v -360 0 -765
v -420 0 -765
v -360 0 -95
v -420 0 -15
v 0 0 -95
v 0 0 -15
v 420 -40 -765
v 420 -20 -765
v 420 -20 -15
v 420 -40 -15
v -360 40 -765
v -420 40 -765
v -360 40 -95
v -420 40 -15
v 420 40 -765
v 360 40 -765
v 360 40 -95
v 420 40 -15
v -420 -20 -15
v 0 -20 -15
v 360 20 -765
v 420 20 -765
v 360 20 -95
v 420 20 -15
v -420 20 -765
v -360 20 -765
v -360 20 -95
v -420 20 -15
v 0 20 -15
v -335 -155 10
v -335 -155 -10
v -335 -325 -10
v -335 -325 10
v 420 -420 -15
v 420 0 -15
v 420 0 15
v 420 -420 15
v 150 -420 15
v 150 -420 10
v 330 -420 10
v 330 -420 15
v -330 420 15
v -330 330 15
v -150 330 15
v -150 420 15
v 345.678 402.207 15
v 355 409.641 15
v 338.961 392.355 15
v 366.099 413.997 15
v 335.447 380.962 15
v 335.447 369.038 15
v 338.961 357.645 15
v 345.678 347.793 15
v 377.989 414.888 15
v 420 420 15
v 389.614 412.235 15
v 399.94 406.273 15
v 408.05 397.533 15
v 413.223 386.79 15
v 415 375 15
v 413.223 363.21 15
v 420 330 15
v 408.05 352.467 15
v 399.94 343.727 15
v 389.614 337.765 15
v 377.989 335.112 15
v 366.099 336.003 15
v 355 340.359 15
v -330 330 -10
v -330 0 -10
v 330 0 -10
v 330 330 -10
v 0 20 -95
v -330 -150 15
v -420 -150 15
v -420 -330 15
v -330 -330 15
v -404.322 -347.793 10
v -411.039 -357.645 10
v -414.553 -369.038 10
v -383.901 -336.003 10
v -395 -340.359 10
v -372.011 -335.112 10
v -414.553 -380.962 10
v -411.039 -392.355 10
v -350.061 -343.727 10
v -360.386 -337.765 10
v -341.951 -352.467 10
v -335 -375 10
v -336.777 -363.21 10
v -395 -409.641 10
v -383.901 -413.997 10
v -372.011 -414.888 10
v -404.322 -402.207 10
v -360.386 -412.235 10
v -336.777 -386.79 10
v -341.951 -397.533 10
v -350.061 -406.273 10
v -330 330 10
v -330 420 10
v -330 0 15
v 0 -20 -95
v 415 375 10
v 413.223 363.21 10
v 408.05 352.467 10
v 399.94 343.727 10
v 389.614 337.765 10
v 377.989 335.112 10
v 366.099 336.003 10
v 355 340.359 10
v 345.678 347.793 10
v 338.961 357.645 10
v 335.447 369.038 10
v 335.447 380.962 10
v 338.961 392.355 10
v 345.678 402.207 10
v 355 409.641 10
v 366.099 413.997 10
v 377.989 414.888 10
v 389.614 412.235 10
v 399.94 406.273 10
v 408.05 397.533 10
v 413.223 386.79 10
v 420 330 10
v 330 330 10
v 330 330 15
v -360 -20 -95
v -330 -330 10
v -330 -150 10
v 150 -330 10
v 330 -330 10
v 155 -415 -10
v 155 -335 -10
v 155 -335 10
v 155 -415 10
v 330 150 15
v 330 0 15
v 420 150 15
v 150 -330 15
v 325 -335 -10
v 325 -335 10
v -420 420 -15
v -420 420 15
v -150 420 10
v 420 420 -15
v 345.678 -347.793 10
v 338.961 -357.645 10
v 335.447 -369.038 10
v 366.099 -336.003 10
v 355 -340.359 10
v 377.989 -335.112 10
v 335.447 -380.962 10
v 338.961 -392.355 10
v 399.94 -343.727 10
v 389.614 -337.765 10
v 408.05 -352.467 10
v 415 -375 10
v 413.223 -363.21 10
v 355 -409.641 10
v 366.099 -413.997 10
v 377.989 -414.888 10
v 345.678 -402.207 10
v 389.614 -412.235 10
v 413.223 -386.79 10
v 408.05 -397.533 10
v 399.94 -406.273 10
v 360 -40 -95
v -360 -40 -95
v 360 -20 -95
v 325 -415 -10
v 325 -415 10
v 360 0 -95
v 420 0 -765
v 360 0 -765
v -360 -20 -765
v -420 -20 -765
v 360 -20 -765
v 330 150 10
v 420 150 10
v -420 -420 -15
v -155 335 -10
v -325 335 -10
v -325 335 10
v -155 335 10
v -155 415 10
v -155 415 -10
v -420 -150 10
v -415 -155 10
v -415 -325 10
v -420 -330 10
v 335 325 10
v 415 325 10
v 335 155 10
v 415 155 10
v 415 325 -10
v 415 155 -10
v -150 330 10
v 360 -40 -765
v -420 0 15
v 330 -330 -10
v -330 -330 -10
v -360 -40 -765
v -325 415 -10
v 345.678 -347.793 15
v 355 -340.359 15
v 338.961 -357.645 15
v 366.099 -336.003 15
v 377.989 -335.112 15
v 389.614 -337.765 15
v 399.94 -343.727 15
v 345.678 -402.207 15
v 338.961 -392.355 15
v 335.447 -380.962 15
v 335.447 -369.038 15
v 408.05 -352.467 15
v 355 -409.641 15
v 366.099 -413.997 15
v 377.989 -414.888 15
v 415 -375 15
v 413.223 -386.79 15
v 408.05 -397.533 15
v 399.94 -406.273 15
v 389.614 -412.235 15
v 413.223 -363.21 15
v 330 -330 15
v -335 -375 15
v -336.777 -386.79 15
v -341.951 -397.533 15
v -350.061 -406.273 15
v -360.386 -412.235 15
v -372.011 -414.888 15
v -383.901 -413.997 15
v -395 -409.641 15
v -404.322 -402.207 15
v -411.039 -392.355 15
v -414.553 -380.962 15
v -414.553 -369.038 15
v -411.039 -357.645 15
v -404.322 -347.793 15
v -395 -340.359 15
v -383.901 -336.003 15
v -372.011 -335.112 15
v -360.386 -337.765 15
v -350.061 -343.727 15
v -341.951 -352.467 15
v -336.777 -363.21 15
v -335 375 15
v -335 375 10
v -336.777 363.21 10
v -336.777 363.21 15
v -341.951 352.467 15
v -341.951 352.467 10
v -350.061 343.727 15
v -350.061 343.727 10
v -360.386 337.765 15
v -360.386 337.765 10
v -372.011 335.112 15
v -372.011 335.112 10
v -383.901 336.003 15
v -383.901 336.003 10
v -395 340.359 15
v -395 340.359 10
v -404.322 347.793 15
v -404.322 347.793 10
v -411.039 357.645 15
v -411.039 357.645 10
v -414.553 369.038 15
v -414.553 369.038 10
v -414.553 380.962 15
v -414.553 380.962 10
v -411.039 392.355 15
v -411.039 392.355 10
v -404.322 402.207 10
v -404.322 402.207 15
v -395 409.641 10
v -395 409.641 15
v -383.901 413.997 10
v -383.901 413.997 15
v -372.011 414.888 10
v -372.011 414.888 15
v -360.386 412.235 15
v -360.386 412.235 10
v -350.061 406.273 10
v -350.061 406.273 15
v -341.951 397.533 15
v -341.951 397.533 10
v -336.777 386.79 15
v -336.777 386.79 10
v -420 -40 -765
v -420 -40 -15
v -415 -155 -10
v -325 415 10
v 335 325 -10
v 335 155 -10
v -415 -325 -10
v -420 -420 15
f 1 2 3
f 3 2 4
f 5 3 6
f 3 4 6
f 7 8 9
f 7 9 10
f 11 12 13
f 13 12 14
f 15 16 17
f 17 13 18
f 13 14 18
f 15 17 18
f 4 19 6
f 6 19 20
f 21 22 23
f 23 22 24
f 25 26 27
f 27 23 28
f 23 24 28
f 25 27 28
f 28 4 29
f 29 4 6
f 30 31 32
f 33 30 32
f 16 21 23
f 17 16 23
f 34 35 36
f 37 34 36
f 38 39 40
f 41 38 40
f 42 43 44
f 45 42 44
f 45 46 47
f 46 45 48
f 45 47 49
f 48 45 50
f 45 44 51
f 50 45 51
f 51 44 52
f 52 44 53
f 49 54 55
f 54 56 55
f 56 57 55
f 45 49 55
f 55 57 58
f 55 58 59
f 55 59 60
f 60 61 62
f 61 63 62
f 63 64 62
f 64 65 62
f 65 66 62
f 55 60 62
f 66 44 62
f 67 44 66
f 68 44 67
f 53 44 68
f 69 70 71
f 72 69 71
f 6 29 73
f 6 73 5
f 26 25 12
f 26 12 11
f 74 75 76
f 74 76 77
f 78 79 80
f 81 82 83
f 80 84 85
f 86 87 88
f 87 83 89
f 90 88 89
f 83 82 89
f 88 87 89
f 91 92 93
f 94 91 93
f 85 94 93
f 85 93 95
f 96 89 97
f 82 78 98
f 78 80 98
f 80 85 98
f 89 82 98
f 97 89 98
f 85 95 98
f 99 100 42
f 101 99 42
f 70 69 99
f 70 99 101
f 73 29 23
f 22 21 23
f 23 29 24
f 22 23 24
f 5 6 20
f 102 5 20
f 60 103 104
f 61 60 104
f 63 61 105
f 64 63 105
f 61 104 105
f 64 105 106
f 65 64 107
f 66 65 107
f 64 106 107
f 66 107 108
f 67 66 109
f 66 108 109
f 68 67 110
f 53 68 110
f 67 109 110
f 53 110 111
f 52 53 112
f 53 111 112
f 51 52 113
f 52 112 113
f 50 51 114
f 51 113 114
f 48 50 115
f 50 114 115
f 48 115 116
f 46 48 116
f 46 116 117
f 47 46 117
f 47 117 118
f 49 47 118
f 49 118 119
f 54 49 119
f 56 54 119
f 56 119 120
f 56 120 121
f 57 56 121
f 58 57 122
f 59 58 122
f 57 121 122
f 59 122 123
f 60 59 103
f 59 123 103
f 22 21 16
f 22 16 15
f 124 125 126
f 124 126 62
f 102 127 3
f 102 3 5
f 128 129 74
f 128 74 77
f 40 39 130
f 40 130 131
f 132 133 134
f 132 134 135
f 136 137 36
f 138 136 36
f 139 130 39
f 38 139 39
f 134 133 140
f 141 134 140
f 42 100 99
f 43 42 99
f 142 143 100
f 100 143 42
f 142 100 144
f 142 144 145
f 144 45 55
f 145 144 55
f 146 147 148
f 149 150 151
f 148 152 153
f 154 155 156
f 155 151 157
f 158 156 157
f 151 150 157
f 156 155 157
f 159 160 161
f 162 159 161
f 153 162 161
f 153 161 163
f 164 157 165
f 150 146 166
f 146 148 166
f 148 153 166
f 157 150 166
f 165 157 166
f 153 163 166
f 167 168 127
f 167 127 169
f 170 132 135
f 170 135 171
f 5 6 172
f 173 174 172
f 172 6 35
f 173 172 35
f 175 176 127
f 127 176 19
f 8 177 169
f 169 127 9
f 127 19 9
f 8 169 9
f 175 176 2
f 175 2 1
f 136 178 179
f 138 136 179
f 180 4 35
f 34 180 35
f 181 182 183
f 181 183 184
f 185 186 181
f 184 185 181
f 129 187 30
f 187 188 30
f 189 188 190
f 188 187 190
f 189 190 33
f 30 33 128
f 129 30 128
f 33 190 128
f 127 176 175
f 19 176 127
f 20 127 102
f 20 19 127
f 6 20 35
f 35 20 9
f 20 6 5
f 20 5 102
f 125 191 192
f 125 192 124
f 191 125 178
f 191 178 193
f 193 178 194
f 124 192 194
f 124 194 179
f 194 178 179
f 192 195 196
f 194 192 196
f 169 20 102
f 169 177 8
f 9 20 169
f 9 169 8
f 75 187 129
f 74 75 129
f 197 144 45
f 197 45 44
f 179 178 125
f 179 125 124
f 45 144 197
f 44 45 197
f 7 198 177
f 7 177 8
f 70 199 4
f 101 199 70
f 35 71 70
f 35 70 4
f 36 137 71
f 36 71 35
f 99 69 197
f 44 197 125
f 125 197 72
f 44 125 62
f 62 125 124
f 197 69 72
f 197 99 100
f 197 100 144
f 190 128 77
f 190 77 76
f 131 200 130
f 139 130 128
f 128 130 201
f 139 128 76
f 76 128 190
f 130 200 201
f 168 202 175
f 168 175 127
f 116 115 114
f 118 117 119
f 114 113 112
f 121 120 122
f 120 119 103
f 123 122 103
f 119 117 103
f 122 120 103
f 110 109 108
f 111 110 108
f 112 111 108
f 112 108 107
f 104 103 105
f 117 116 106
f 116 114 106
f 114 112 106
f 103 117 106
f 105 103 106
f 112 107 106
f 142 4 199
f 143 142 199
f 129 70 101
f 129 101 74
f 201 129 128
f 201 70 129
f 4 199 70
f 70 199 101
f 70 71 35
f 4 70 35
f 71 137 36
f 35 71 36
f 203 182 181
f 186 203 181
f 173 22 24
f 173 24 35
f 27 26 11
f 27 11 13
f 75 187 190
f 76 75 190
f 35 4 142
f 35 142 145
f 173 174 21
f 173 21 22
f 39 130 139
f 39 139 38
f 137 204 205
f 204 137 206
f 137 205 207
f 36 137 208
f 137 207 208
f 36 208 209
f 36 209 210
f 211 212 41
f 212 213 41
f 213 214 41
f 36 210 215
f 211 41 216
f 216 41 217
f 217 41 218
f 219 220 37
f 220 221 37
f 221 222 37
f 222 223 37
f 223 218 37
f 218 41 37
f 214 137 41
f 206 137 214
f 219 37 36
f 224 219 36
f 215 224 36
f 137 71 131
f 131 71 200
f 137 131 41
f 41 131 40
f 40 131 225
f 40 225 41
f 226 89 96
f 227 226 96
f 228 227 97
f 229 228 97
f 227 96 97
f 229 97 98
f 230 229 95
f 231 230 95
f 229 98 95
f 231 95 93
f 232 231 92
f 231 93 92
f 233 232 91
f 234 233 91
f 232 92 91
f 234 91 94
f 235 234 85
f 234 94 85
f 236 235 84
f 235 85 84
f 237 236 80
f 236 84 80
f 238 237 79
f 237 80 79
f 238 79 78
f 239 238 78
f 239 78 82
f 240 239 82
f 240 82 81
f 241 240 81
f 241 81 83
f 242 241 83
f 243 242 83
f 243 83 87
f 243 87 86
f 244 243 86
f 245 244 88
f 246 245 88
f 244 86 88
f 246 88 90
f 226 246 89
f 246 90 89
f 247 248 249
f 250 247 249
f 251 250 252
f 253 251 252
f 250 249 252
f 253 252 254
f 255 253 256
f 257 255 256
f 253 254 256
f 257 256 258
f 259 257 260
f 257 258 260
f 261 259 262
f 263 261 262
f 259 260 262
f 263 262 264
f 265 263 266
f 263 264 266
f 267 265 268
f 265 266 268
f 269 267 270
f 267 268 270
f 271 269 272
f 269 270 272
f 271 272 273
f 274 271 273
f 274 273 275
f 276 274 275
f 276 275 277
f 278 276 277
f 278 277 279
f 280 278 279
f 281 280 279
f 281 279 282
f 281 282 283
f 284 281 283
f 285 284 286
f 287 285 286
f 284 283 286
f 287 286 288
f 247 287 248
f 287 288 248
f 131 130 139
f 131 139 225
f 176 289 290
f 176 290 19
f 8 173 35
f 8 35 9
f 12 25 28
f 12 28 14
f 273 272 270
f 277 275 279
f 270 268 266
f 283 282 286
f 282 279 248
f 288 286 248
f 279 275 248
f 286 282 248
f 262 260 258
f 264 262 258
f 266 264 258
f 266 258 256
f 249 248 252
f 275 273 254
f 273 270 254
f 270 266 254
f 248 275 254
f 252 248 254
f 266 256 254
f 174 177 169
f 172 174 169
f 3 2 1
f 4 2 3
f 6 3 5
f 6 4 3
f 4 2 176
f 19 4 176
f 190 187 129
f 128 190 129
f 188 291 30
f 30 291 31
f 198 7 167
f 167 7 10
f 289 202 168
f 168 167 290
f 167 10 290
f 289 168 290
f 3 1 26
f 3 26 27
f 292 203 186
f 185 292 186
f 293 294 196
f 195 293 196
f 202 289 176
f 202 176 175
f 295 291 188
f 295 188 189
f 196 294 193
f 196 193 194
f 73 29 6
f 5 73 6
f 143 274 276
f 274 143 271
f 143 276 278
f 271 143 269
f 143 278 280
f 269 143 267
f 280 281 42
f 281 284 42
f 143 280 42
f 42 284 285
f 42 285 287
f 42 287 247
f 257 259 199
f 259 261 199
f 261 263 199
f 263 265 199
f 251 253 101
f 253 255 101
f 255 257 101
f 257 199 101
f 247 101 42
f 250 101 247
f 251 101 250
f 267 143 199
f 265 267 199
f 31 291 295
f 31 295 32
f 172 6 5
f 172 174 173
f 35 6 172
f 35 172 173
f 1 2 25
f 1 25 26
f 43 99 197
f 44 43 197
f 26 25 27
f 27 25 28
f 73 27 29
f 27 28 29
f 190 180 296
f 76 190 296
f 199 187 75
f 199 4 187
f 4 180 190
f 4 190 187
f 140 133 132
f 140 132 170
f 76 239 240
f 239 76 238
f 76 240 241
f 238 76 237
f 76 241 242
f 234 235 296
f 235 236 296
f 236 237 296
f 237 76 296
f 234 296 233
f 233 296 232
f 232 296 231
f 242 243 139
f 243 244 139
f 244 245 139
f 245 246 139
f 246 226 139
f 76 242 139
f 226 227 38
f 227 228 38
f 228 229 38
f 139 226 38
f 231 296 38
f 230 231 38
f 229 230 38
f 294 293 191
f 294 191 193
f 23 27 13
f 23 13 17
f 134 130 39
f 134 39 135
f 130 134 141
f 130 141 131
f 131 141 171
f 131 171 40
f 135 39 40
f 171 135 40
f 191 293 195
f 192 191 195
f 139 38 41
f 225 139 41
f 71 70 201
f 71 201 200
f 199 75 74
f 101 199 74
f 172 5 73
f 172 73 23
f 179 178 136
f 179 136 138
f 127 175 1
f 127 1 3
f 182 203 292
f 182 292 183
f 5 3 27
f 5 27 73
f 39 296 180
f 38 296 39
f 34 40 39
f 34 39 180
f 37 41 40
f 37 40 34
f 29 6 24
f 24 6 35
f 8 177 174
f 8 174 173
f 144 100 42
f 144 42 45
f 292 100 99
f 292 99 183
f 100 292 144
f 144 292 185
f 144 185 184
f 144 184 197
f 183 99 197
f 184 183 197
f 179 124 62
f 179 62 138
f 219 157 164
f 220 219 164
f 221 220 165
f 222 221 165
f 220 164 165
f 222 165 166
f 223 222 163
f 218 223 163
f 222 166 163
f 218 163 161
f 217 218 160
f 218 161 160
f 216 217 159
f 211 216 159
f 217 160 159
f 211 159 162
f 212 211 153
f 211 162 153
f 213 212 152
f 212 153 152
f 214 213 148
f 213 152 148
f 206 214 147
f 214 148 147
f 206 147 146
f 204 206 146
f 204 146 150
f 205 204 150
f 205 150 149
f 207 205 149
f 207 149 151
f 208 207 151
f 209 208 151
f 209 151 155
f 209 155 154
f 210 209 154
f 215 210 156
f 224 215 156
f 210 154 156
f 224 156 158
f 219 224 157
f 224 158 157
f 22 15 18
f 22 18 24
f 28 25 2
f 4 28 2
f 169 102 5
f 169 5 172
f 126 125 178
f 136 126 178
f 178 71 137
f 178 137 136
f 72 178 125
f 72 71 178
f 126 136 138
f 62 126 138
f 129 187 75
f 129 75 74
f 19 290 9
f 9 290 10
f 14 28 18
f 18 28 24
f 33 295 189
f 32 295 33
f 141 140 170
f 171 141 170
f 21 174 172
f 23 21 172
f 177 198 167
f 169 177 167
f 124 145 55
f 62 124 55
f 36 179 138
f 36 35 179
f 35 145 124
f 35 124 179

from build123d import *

# Parameters (mm, degrees)
F0_W      = 840
F0_H      = 5
F1_DEPTH  = 420
F2_DEPTH  = 420
F3_R      = 40
F3_W      = 90
F3_H      = 150
F3_H_2    = 180
F3_W_2    = 80
F3_H_3    = 170
F3_W_3    = 180
F3_H_4    = 90
F3_W_4    = 170
F3_H_5    = 80
F4_DEPTH  = 30
F3_W_5    = 80.0002463284
F5_DEPTH  = 30
F3_W_6    = 0.0002463284
F6_DEPTH  = 5
F11_DEPTH = 750
F10_W     = 420
F10_H     = 20
F12_DEPTH = 750
F13_DEPTH = 750
F14_W     = 720
F14_H     = 670
F15_DEPTH = 201


with BuildPart() as f1:
    # F0 (on Front) → F1 (new body)
    with BuildSketch(Plane.XZ):
        with Locations((0, -12.5)):
            Rectangle(F0_W, F0_H)
    extrude(amount=F1_DEPTH)

    # F3 (on face) → F5 (join)
    with BuildSketch(Plane(origin=(0, 0, -15), x_dir=(1, 0, 0), z_dir=(0, 0, -1))):
        with Locations((-375, 75)):
            Rectangle(F3_W, F3_H)
        Polygon((-330, 330), (150, 330), (150, 420), (-420, 420), (-420, 330), align=None)
        with Locations((-375.0001231642, 375)):
            Circle(F3_R, mode=Mode.SUBTRACT)
        Polygon((330, 330), (330, 0), (420, 0), (420, 420), (330, 420), align=None)
        with Locations((375, 375)):
            Circle(F3_R, mode=Mode.SUBTRACT)
        with Locations((-375.0001231642, 375)):
            Circle(F3_R)
        with Locations((375, 375)):
            Circle(F3_R)
        with Locations((-375, 240)):
            Rectangle(F3_W, F3_H_2)
        with Locations((-375.0001231642, 240)):
            Rectangle(F3_W_5, F3_H_3, mode=Mode.SUBTRACT)
        with Locations((240, 375)):
            Rectangle(F3_W_3, F3_H_4)
        with Locations((240, 375)):
            Rectangle(F3_W_4, F3_H_5, mode=Mode.SUBTRACT)
    extrude(amount=-F5_DEPTH)


with BuildPart() as f2:
    # F0 (on Front) → F2 (new body)
    with BuildSketch(Plane.XZ):
        with Locations((0, -12.5)):
            Rectangle(F0_W, F0_H)
    extrude(amount=-F2_DEPTH)

    # F3 (on face) → F4 (join)
    with BuildSketch(Plane(origin=(0, 0, -15), x_dir=(1, 0, 0), z_dir=(0, 0, -1))):
        Polygon((420, -330), (330, -330), (-150, -330), (-150, -420), (420, -420), align=None)
        with Locations((375, -375)):
            Circle(F3_R, mode=Mode.SUBTRACT)
        Polygon((-330, -420), (-330, -330), (-330, 0), (-420, 0), (-420, -420), align=None)
        with Locations((-375.0001231642, -375)):
            Circle(F3_R, mode=Mode.SUBTRACT)
        with Locations((375, -75)):
            Rectangle(F3_W, F3_H)
        with Locations((375, -240)):
            Rectangle(F3_W, F3_H_2)
        with Locations((375, -240)):
            Rectangle(F3_W_2, F3_H_3, mode=Mode.SUBTRACT)
        with Locations((-240, -375)):
            Rectangle(F3_W_3, F3_H_4)
        with Locations((-240, -375)):
            Rectangle(F3_W_4, F3_H_5, mode=Mode.SUBTRACT)
        with Locations((-375.0001231642, -375)):
            Circle(F3_R)
        with Locations((375, -375)):
            Circle(F3_R)
    extrude(amount=-F4_DEPTH)


with BuildPart() as f6:
    # F3 (on face) → F6 (new body)
    with BuildSketch(Plane(origin=(0, 0, -15), x_dir=(1, 0, 0), z_dir=(0, 0, -1))):
        with Locations((-375, 240)):
            Rectangle(F3_W, F3_H_2)
        with Locations((-375.0001231642, 240)):
            Rectangle(F3_W_5, F3_H_3, mode=Mode.SUBTRACT)
        with Locations((-375.0001231642, 240)):
            Rectangle(F3_W_5, F3_H_3)
        with Locations((-420.0001231642, 240)):
            Rectangle(F3_W_6, F3_H_2)
    extrude(amount=-F6_DEPTH)


with BuildPart() as f6b:
    # F3 (on face) → F6, piece 2 (new body)
    with BuildSketch(Plane(origin=(0, 0, -15), x_dir=(1, 0, 0), z_dir=(0, 0, -1))):
        with Locations((240, 375)):
            Rectangle(F3_W_3, F3_H_4)
        with Locations((240, 375)):
            Rectangle(F3_W_4, F3_H_5, mode=Mode.SUBTRACT)
        with Locations((240, 375)):
            Rectangle(F3_W_4, F3_H_5)
    extrude(amount=-F6_DEPTH)


with BuildPart() as f6c:
    # F3 (on face) → F6, piece 3 (new body)
    with BuildSketch(Plane(origin=(0, 0, -15), x_dir=(1, 0, 0), z_dir=(0, 0, -1))):
        with Locations((375, -240)):
            Rectangle(F3_W, F3_H_2)
        with Locations((375, -240)):
            Rectangle(F3_W_2, F3_H_3, mode=Mode.SUBTRACT)
        with Locations((375, -240)):
            Rectangle(F3_W_2, F3_H_3)
    extrude(amount=-F6_DEPTH)


with BuildPart() as f6d:
    # F3 (on face) → F6, piece 4 (new body)
    with BuildSketch(Plane(origin=(0, 0, -15), x_dir=(1, 0, 0), z_dir=(0, 0, -1))):
        with Locations((-240, -375)):
            Rectangle(F3_W_3, F3_H_4)
        with Locations((-240, -375)):
            Rectangle(F3_W_4, F3_H_5, mode=Mode.SUBTRACT)
        with Locations((-240, -375)):
            Rectangle(F3_W_4, F3_H_5)
    extrude(amount=-F6_DEPTH)


with BuildPart() as f6e:
    # F3 (on face) → F6, piece 5 (new body)
    with BuildSketch(Plane(origin=(0, 0, -15), x_dir=(1, 0, 0), z_dir=(0, 0, -1))):
        with Locations((-375.0001231642, 375)):
            Circle(F3_R)
    extrude(amount=-F6_DEPTH)


with BuildPart() as f6f:
    # F3 (on face) → F6, piece 6 (new body)
    with BuildSketch(Plane(origin=(0, 0, -15), x_dir=(1, 0, 0), z_dir=(0, 0, -1))):
        with Locations((-375.0001231642, -375)):
            Circle(F3_R)
    extrude(amount=-F6_DEPTH)


with BuildPart() as f6g:
    # F3 (on face) → F6, piece 7 (new body)
    with BuildSketch(Plane(origin=(0, 0, -15), x_dir=(1, 0, 0), z_dir=(0, 0, -1))):
        with Locations((375, -375)):
            Circle(F3_R)
    extrude(amount=-F6_DEPTH)


with BuildPart() as f6h:
    # F3 (on face) → F6, piece 8 (new body)
    with BuildSketch(Plane(origin=(0, 0, -15), x_dir=(1, 0, 0), z_dir=(0, 0, -1))):
        with Locations((375, 375)):
            Circle(F3_R)
    extrude(amount=-F6_DEPTH)


with BuildPart() as f6d_1:
    # F7: moved
    add(f6d.part.moved(Location((0, 0, 25))))


with BuildPart() as f6_1:
    # F7: moved
    add(f6.part.moved(Location((0, 0, 25))))


with BuildPart() as f6c_1:
    # F7: moved
    add(f6c.part.moved(Location((0, 0, 25))))


with BuildPart() as f6b_1:
    # F7: moved
    add(f6b.part.moved(Location((0, 0, 25))))


with BuildPart() as f6f_1:
    # F7: moved
    add(f6f.part.moved(Location((0, 0, 25))))


with BuildPart() as f6e_1:
    # F7: moved
    add(f6e.part.moved(Location((0, 0, 25))))


with BuildPart() as f6h_1:
    # F7: moved
    add(f6h.part.moved(Location((0, 0, 25))))


with BuildPart() as f6g_1:
    # F7: moved
    add(f6g.part.moved(Location((0, 0, 25))))


with BuildPart() as f2_1:
    add(f2.part)

    # F8: cut F6d, F6c, F6b, F6
    add(f6d_1.part, mode=Mode.SUBTRACT)
    add(f6c_1.part, mode=Mode.SUBTRACT)
    add(f6b_1.part, mode=Mode.SUBTRACT)
    add(f6_1.part, mode=Mode.SUBTRACT)

    # F9: cut F6g, F6f, F6e, F6h
    add(f6g_1.part, mode=Mode.SUBTRACT)
    add(f6f_1.part, mode=Mode.SUBTRACT)
    add(f6e_1.part, mode=Mode.SUBTRACT)
    add(f6h_1.part, mode=Mode.SUBTRACT)


with BuildPart() as f1_1:
    add(f1.part)

    # F8: cut F6d, F6c, F6b, F6
    add(f6d_1.part, mode=Mode.SUBTRACT)
    add(f6c_1.part, mode=Mode.SUBTRACT)
    add(f6b_1.part, mode=Mode.SUBTRACT)
    add(f6_1.part, mode=Mode.SUBTRACT)

    # F9: cut F6g, F6f, F6e, F6h
    add(f6g_1.part, mode=Mode.SUBTRACT)
    add(f6f_1.part, mode=Mode.SUBTRACT)
    add(f6e_1.part, mode=Mode.SUBTRACT)
    add(f6h_1.part, mode=Mode.SUBTRACT)


with BuildPart() as f11:
    # F10 (on face) → F11 (new body)
    with BuildSketch(Plane(origin=(0, 0, -15), x_dir=(1, 0, 0), z_dir=(0, 0, -1))):
        Polygon((-420, 40), (-420, 20), (0, 20), (420, 20), (420, 40), align=None)
    extrude(amount=F11_DEPTH)


with BuildPart() as f11b:
    # F10 (on face) → F11, piece 2 (new body)
    with BuildSketch(Plane(origin=(0, 0, -15), x_dir=(1, 0, 0), z_dir=(0, 0, -1))):
        Polygon((0, -20), (-420, -20), (-420, -40), (420, -40), (420, -20), align=None)
    extrude(amount=F11_DEPTH)


with BuildPart() as f12:
    # F10 (on face) → F12 (new body, through all)
    with BuildSketch(Plane(origin=(0, 0, -15), x_dir=(1, 0, 0), z_dir=(0, 0, -1))):
        with Locations((-210, 10)):
            Rectangle(F10_W, F10_H)
    extrude(amount=F12_DEPTH)


with BuildPart() as f12b:
    # F10 (on face) → F12, piece 2 (new body, through all)
    with BuildSketch(Plane(origin=(0, 0, -15), x_dir=(1, 0, 0), z_dir=(0, 0, -1))):
        with Locations((210, -10)):
            Rectangle(F10_W, F10_H)
    extrude(amount=F12_DEPTH)


with BuildPart() as f13:
    # F10 (on face) → F13 (new body, through all)
    with BuildSketch(Plane(origin=(0, 0, -15), x_dir=(1, 0, 0), z_dir=(0, 0, -1))):
        with Locations((210, 10)):
            Rectangle(F10_W, F10_H)
    extrude(amount=F13_DEPTH)


with BuildPart() as f13b:
    # F10 (on face) → F13, piece 2 (new body, through all)
    with BuildSketch(Plane(origin=(0, 0, -15), x_dir=(1, 0, 0), z_dir=(0, 0, -1))):
        with Locations((-210, -10)):
            Rectangle(F10_W, F10_H)
    extrude(amount=F13_DEPTH)


with BuildPart() as f15_tool:
    # F14 (on face) → F15 (new body)
    with BuildSketch(Plane.XZ.offset(40)):
        with Locations((0, -430)):
            Rectangle(F14_W, F14_H)
    extrude(amount=-F15_DEPTH)


with BuildPart() as f11_1:
    add(f11.part)

    # F15: cut by f15_tool
    add(f15_tool.part, mode=Mode.SUBTRACT)


with BuildPart() as f11b_1:
    add(f11b.part)

    # F15: cut by f15_tool
    add(f15_tool.part, mode=Mode.SUBTRACT)


with BuildPart() as f12_1:
    add(f12.part)

    # F15: cut by f15_tool
    add(f15_tool.part, mode=Mode.SUBTRACT)


with BuildPart() as f12b_1:
    add(f12b.part)

    # F15: cut by f15_tool
    add(f15_tool.part, mode=Mode.SUBTRACT)


with BuildPart() as f13_1:
    add(f13.part)

    # F15: cut by f15_tool
    add(f15_tool.part, mode=Mode.SUBTRACT)


with BuildPart() as f13b_1:
    add(f13b.part)

    # F15: cut by f15_tool
    add(f15_tool.part, mode=Mode.SUBTRACT)


solid = Compound([f6d_1.part, f6_1.part, f6c_1.part, f6b_1.part, f2_1.part, f1_1.part, f11_1.part, f11b_1.part, f12_1.part, f12b_1.part, f13_1.part, f13b_1.part])
